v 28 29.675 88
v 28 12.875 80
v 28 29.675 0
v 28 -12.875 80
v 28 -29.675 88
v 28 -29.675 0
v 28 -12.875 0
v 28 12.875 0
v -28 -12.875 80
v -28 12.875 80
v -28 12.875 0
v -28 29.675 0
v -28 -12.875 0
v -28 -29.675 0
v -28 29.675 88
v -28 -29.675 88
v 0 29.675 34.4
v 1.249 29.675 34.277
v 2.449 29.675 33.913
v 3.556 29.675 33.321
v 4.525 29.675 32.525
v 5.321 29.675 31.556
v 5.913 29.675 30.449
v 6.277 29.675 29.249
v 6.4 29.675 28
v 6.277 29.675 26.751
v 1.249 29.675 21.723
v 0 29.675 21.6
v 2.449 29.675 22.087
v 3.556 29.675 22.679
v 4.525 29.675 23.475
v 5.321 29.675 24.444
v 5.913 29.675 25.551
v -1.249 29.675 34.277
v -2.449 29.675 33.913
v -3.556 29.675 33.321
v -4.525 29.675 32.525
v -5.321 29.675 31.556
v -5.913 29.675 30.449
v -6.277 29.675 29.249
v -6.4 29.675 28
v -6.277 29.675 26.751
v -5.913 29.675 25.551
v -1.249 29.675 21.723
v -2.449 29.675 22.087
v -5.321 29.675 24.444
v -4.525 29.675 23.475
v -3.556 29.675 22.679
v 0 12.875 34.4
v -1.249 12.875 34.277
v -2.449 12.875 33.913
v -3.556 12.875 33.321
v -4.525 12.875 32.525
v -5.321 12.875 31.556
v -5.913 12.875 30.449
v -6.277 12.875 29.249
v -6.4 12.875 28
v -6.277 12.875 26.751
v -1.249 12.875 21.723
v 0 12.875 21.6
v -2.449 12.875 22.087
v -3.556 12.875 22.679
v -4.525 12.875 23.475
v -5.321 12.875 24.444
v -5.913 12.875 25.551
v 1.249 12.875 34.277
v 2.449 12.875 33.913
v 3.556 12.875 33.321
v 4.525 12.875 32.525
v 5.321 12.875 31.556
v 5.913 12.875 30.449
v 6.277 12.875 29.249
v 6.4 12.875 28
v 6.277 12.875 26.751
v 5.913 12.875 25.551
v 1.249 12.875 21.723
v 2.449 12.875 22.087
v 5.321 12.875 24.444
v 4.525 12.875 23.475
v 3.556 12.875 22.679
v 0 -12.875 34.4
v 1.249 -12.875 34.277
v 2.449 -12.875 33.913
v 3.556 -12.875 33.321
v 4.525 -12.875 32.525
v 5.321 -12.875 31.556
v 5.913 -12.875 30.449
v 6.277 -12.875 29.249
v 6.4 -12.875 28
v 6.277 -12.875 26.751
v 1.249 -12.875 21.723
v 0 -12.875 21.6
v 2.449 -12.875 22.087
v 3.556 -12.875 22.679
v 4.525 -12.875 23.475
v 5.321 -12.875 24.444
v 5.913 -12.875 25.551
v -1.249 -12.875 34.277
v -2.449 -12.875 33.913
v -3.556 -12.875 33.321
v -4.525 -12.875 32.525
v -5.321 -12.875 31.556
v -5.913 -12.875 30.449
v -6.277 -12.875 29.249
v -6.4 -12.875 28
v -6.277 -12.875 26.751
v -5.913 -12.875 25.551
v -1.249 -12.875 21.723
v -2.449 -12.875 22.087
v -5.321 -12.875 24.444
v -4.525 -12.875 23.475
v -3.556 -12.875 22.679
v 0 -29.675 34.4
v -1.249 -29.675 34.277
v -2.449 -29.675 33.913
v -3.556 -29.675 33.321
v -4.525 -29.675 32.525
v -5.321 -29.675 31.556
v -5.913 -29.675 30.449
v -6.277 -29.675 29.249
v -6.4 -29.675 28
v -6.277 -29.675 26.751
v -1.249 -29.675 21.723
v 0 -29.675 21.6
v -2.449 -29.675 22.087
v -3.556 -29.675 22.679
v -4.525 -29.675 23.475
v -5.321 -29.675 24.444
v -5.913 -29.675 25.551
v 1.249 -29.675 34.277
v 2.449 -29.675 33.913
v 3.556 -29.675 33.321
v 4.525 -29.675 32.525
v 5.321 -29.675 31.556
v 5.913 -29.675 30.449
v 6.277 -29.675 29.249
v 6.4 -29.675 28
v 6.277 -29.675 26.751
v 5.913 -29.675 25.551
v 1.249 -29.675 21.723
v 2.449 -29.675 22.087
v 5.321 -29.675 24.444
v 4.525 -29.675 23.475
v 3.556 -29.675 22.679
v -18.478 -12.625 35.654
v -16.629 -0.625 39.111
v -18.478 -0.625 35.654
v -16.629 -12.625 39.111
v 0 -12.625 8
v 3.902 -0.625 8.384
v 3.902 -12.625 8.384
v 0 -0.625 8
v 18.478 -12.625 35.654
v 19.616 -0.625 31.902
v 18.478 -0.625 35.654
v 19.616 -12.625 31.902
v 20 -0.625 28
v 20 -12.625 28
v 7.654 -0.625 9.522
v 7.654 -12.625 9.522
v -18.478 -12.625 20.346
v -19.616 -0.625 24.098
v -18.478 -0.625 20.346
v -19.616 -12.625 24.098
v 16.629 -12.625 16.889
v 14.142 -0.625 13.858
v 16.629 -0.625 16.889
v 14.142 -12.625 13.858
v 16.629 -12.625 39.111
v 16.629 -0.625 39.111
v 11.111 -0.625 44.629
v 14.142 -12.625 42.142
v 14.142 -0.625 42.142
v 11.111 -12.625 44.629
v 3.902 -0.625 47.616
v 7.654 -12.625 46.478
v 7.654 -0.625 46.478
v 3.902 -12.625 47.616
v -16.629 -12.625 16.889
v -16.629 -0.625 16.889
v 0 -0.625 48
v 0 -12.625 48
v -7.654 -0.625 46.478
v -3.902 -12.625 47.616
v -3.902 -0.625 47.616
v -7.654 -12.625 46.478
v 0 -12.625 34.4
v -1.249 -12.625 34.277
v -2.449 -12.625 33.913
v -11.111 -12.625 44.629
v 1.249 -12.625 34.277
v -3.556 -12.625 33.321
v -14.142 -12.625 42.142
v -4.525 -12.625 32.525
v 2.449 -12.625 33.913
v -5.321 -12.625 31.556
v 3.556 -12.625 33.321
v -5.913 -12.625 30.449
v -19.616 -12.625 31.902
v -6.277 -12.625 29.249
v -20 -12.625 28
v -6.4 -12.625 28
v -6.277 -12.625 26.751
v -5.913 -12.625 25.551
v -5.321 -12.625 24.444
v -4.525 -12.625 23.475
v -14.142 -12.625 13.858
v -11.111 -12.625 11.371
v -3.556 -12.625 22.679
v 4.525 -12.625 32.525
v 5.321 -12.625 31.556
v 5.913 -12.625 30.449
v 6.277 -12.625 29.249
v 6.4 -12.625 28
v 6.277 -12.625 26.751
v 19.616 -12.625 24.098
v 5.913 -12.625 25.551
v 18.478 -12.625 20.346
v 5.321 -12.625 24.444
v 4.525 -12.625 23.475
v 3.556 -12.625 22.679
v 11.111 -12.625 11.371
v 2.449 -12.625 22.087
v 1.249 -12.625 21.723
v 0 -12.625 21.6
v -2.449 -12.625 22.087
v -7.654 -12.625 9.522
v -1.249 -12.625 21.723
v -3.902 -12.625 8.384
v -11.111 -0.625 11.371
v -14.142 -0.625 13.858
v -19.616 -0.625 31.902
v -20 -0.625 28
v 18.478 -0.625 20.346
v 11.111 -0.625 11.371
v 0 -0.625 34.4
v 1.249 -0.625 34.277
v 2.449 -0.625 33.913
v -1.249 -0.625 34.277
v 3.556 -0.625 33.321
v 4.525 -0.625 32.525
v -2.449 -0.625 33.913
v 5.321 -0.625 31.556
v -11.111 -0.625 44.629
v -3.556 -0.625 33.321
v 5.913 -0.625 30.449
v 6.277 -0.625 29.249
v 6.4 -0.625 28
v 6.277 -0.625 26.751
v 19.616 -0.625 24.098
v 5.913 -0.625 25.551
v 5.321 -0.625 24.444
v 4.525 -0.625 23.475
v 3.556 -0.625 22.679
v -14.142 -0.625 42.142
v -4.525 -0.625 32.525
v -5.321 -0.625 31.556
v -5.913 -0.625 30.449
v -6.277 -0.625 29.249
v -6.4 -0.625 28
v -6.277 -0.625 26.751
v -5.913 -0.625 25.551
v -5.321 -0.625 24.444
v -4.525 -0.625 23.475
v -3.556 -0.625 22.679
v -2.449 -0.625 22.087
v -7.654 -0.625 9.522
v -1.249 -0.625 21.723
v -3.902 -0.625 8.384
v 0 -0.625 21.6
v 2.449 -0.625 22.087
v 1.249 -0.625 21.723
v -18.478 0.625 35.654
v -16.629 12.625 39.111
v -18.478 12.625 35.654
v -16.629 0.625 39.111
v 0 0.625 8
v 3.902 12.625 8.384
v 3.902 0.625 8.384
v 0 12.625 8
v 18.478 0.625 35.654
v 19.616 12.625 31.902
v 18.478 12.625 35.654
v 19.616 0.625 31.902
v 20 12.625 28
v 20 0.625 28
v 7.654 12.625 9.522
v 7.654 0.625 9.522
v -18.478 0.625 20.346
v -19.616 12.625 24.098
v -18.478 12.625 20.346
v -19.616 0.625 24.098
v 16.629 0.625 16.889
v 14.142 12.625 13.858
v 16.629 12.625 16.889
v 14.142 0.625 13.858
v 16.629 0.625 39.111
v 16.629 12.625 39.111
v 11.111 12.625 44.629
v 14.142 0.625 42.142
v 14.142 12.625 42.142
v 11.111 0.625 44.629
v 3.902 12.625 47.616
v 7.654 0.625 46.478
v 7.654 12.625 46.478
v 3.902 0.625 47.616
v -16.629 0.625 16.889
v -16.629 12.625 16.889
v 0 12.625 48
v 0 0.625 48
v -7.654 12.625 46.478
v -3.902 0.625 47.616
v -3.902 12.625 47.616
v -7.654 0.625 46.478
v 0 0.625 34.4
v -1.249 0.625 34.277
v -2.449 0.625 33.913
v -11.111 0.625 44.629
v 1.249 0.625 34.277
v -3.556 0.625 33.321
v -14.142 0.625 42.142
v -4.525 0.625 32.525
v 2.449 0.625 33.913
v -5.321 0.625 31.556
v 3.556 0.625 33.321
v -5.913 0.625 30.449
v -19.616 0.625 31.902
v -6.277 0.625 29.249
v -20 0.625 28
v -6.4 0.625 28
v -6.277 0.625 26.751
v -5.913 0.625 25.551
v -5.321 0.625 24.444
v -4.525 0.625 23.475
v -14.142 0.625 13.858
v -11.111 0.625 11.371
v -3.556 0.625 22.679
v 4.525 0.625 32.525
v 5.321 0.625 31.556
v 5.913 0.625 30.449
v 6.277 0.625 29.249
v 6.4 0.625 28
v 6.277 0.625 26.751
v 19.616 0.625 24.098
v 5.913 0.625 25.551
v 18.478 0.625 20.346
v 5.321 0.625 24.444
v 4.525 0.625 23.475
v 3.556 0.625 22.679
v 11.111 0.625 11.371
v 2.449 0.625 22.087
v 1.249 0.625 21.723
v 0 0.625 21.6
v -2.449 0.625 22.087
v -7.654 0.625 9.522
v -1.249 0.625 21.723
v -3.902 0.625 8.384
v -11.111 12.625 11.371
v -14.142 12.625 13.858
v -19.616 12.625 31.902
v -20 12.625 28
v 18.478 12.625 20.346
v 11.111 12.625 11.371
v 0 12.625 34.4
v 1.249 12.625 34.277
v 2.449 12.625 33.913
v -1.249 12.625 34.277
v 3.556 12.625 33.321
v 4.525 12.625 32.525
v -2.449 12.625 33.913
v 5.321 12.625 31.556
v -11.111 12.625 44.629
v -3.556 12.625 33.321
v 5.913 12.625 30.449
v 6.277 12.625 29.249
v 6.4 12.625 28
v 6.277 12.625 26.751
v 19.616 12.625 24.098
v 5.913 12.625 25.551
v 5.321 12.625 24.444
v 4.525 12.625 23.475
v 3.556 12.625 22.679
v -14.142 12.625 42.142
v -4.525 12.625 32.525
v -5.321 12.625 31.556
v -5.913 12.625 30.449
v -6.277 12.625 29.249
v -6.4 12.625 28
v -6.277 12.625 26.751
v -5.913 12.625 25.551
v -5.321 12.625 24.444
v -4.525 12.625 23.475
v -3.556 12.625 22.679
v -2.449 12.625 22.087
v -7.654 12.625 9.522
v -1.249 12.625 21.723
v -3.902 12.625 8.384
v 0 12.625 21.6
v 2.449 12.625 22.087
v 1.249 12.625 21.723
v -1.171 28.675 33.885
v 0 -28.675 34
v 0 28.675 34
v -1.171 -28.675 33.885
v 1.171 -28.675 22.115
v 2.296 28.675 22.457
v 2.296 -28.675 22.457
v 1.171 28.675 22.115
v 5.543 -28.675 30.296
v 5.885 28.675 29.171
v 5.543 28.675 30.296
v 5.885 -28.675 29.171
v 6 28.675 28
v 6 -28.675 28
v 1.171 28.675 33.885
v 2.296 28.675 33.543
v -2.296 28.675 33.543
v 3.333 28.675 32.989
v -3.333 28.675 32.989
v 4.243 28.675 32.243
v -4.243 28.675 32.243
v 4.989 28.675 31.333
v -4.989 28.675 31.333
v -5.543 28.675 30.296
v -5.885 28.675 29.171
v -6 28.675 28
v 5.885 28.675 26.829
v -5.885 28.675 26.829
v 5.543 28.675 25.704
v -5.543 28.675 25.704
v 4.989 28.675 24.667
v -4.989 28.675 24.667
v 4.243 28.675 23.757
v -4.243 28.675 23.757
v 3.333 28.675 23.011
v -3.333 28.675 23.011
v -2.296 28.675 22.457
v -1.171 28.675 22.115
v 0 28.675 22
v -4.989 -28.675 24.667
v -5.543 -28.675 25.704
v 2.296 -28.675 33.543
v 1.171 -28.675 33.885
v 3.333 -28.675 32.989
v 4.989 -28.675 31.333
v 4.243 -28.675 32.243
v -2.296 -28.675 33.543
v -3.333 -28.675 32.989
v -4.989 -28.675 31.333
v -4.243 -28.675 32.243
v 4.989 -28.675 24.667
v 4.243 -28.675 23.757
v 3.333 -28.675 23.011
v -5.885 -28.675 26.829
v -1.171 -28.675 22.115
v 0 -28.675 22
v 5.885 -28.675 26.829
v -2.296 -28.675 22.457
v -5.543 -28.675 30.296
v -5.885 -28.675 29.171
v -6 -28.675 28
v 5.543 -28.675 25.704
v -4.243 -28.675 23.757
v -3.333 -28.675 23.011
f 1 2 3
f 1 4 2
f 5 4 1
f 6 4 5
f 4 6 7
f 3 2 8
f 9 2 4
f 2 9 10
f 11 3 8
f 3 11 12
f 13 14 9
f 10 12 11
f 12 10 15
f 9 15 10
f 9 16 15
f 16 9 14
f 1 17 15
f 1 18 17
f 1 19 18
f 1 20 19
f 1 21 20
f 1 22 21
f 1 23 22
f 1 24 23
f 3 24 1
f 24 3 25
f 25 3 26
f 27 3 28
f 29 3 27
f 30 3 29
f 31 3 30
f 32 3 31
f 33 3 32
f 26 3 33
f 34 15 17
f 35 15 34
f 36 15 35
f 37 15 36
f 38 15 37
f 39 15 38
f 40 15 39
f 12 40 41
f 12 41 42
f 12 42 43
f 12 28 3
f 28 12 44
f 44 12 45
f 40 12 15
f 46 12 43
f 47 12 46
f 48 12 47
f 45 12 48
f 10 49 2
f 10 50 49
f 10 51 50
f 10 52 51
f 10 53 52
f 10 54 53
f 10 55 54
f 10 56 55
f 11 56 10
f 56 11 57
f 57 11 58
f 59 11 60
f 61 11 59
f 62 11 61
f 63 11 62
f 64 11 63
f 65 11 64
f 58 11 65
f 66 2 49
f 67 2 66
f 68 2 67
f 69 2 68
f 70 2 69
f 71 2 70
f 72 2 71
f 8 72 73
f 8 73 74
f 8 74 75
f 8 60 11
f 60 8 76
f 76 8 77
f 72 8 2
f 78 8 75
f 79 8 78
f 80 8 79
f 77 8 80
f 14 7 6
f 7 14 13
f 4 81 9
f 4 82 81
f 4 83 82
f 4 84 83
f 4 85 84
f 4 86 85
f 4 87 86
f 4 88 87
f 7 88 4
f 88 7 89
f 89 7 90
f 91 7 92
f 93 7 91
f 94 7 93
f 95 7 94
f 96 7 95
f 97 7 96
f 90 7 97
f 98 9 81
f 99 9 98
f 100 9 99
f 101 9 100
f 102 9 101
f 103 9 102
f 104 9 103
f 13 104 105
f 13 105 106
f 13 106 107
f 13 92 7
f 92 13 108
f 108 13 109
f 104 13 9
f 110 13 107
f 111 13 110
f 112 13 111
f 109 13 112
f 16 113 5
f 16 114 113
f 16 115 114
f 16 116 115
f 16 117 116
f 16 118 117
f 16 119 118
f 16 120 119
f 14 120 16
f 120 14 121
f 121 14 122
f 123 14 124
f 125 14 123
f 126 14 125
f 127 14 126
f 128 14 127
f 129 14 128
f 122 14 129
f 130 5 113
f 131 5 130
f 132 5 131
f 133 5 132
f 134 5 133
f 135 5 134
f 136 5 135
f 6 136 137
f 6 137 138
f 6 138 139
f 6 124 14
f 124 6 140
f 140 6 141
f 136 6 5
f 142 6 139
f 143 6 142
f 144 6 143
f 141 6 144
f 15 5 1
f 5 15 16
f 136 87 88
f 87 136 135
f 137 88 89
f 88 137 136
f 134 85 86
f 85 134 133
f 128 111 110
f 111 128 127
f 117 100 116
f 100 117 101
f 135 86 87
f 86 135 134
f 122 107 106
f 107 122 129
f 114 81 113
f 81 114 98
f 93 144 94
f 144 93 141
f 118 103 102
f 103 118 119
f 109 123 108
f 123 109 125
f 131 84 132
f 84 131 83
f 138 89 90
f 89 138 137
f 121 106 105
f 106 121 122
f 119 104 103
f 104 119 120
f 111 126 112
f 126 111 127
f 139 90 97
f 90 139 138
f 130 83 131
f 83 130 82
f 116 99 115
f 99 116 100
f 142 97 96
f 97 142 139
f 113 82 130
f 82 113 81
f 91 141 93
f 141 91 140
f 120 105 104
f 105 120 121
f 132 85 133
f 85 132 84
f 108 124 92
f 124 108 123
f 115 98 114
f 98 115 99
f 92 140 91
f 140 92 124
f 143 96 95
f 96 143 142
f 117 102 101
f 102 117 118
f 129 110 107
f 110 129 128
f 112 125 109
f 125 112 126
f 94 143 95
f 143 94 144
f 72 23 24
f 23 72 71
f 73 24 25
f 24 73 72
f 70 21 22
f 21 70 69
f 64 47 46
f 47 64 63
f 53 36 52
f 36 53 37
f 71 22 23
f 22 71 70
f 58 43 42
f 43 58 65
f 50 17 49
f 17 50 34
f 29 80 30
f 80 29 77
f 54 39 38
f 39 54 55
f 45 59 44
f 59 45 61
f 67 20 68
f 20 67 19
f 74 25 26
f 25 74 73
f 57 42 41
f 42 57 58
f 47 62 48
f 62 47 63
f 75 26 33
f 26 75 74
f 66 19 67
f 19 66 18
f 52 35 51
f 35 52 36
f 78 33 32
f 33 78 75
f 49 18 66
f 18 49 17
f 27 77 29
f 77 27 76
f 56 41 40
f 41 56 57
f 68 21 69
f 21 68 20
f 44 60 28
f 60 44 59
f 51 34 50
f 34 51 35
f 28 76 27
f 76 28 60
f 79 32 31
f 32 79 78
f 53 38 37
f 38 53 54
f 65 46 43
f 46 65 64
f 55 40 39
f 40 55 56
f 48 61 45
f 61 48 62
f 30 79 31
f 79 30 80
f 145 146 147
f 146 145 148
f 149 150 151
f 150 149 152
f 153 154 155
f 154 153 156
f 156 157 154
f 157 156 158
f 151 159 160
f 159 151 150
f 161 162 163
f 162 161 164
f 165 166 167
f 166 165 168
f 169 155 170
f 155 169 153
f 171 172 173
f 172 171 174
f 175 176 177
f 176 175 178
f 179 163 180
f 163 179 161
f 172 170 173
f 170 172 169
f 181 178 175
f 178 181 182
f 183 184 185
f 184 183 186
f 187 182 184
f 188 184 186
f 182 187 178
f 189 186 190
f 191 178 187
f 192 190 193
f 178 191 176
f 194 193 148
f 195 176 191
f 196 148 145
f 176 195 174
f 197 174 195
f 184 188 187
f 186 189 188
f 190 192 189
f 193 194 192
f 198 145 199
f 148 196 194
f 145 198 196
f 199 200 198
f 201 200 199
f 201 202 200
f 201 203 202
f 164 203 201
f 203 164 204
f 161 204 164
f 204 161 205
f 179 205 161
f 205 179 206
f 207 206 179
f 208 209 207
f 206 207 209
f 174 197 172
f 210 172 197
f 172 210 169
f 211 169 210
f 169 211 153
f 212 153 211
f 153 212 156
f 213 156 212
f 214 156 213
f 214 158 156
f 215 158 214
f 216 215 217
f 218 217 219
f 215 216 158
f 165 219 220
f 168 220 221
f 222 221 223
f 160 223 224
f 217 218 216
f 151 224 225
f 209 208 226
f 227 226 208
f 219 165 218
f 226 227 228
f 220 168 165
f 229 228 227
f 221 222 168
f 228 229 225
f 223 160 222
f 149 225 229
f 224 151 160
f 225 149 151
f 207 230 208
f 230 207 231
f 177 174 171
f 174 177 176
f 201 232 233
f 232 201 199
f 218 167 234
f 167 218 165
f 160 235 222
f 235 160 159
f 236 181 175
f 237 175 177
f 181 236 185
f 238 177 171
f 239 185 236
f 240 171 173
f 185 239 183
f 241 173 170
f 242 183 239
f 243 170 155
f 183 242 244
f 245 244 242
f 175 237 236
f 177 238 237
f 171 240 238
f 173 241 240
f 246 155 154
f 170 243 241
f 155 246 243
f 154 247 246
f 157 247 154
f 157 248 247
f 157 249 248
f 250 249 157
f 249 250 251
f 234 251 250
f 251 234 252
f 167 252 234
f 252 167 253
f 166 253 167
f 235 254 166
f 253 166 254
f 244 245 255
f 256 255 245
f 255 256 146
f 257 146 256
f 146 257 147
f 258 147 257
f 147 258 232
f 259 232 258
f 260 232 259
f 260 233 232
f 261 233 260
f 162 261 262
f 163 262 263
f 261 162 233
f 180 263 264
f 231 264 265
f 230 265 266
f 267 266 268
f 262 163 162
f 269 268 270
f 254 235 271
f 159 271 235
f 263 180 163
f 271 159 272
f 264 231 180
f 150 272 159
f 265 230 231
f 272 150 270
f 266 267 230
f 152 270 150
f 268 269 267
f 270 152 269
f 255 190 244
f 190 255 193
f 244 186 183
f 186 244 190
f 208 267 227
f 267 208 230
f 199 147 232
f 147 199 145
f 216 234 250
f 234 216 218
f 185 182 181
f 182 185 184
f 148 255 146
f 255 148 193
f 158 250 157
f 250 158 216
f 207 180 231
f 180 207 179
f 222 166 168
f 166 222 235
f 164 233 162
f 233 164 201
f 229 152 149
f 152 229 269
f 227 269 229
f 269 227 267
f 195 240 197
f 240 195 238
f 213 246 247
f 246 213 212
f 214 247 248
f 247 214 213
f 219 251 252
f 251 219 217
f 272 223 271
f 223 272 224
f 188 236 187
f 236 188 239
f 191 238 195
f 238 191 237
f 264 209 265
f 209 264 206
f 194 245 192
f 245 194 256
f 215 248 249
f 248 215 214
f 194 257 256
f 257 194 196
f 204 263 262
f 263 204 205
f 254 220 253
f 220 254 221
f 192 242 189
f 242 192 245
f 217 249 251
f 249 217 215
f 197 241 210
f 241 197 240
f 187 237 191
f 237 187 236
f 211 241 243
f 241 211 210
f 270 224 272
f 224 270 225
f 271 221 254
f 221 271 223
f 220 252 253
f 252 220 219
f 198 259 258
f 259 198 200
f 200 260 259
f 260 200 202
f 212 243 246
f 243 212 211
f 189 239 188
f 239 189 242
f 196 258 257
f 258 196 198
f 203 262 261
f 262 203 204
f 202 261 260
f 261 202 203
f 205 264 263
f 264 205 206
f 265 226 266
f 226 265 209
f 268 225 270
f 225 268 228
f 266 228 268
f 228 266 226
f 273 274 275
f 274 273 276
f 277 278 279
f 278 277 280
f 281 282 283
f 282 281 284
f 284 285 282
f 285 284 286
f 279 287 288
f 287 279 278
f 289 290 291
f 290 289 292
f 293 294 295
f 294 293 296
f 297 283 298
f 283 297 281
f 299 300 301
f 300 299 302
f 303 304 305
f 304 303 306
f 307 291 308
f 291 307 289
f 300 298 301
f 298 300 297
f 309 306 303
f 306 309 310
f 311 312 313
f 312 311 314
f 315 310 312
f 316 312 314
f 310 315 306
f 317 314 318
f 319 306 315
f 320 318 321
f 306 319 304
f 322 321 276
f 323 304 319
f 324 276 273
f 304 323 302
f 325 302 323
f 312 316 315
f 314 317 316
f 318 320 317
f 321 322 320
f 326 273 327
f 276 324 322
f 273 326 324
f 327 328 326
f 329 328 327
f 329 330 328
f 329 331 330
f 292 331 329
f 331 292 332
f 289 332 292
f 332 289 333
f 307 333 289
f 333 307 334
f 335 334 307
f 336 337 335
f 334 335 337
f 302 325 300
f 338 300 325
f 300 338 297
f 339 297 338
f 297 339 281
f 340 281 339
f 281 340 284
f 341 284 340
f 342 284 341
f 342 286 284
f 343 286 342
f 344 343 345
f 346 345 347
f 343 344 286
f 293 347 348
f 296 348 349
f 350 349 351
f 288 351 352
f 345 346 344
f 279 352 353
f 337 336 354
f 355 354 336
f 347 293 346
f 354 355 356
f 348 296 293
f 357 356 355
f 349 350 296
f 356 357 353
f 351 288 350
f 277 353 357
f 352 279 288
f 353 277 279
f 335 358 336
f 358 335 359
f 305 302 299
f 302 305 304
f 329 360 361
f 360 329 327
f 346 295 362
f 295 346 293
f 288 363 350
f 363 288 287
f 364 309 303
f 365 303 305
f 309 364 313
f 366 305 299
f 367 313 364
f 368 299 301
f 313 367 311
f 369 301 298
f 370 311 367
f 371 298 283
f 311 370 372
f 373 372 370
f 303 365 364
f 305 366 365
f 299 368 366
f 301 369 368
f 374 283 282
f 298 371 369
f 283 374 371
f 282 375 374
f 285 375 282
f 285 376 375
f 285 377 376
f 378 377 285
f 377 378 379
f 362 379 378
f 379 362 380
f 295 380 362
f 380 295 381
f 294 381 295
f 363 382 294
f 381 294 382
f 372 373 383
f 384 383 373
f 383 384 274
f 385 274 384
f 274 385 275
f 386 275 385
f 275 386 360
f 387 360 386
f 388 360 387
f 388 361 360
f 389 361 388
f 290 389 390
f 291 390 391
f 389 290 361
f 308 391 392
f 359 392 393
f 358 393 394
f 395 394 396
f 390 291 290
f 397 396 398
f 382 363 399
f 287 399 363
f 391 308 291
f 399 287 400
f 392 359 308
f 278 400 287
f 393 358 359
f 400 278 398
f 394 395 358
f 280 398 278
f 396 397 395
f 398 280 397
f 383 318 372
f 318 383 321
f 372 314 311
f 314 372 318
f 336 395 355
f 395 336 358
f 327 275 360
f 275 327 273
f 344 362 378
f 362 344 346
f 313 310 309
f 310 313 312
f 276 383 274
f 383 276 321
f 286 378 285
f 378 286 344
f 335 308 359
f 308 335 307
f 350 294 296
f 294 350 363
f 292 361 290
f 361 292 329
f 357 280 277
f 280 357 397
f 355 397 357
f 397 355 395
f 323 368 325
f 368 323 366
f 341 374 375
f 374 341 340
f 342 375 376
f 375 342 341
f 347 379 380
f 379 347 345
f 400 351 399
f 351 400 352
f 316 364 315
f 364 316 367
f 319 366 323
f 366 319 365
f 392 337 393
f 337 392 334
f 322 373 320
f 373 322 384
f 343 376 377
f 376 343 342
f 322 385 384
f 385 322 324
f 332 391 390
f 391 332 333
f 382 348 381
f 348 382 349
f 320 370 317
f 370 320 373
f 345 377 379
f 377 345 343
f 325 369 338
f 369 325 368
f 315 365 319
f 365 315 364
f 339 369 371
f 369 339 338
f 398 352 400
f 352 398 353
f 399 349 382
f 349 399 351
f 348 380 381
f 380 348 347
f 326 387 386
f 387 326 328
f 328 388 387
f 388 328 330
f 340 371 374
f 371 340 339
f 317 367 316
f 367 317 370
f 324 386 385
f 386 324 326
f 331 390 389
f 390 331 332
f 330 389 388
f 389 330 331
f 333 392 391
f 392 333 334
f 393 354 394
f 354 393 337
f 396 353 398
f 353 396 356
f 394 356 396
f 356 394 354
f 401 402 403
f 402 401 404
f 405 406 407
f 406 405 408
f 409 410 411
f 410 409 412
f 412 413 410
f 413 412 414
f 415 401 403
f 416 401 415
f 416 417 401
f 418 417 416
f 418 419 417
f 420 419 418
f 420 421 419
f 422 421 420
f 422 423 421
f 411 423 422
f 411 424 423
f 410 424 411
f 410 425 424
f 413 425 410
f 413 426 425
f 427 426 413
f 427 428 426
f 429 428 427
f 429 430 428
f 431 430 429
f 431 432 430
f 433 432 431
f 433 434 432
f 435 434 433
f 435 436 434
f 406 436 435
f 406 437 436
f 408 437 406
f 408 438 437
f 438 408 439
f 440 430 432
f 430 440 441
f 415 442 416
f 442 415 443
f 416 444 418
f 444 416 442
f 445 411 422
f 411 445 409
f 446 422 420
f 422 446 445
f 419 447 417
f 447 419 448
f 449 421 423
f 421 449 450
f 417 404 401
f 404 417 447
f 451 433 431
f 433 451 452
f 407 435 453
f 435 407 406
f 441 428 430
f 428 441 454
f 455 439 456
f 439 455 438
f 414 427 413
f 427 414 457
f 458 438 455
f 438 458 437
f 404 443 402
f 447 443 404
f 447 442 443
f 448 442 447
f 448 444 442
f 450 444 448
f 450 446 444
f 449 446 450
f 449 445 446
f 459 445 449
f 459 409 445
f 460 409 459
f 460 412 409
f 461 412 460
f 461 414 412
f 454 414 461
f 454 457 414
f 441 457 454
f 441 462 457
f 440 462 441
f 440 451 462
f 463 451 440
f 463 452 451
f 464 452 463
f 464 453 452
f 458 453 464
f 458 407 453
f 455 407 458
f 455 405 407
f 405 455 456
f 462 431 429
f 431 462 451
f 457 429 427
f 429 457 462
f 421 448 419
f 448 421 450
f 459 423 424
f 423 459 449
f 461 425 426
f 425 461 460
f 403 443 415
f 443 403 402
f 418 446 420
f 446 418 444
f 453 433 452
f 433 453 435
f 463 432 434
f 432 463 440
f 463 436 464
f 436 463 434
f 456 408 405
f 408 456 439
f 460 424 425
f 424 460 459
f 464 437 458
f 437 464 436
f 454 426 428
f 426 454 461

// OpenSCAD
$fn = 32;

// ------------------------------------------------------------------------
// Trolley wheel set: wheels d40, fork 80 mm tall
// Every part is its own module, assembly() places every instance.
// ------------------------------------------------------------------------

// --- part 1 ---
module trolley_fork() {
  difference() {
    union() {
      translate([-28, 12.875, 0]) cube([56, 16.8, 80]);
      translate([-28, -29.675, 0]) cube([56, 16.8, 80]);
      translate([-28, -29.675, 80]) cube([56, 59.35, 8]);
    }
    translate([0, -21.275, 28]) rotate([90, 0, 0]) cylinder(h = 18.8, d = 12.8, center = true);
    translate([0, 21.275, 28]) rotate([90, 0, 0]) cylinder(h = 18.8, d = 12.8, center = true);
  }
}

// --- part 2 ---
module trolley_wheel() {
  difference() {
      translate([0, 0, 0]) cylinder(h = 12, d = 40);
      translate([0, 0, -1]) cylinder(h = 14, d = 12.8);
    }
}

// --- part 3 ---
module trolley_axle() {
  translate([0, 0, -28.675]) cylinder(h = 57.35, d = 12);
}

// --- assembly ---
module assembly() {
  color([0.80, 0.24, 0.20]) translate([0, 0, 0]) rotate([0, 0, 0]) trolley_fork();
  color([0.20, 0.45, 0.75]) translate([0, -0.625, 28]) rotate([90, 0, 0]) trolley_wheel();
  color([0.25, 0.62, 0.32]) translate([0, 12.625, 28]) rotate([90, 0, 0]) trolley_wheel();
  color([0.92, 0.70, 0.18]) translate([0, 0, 28]) rotate([90, 0, 0]) trolley_axle();
}

assembly();
